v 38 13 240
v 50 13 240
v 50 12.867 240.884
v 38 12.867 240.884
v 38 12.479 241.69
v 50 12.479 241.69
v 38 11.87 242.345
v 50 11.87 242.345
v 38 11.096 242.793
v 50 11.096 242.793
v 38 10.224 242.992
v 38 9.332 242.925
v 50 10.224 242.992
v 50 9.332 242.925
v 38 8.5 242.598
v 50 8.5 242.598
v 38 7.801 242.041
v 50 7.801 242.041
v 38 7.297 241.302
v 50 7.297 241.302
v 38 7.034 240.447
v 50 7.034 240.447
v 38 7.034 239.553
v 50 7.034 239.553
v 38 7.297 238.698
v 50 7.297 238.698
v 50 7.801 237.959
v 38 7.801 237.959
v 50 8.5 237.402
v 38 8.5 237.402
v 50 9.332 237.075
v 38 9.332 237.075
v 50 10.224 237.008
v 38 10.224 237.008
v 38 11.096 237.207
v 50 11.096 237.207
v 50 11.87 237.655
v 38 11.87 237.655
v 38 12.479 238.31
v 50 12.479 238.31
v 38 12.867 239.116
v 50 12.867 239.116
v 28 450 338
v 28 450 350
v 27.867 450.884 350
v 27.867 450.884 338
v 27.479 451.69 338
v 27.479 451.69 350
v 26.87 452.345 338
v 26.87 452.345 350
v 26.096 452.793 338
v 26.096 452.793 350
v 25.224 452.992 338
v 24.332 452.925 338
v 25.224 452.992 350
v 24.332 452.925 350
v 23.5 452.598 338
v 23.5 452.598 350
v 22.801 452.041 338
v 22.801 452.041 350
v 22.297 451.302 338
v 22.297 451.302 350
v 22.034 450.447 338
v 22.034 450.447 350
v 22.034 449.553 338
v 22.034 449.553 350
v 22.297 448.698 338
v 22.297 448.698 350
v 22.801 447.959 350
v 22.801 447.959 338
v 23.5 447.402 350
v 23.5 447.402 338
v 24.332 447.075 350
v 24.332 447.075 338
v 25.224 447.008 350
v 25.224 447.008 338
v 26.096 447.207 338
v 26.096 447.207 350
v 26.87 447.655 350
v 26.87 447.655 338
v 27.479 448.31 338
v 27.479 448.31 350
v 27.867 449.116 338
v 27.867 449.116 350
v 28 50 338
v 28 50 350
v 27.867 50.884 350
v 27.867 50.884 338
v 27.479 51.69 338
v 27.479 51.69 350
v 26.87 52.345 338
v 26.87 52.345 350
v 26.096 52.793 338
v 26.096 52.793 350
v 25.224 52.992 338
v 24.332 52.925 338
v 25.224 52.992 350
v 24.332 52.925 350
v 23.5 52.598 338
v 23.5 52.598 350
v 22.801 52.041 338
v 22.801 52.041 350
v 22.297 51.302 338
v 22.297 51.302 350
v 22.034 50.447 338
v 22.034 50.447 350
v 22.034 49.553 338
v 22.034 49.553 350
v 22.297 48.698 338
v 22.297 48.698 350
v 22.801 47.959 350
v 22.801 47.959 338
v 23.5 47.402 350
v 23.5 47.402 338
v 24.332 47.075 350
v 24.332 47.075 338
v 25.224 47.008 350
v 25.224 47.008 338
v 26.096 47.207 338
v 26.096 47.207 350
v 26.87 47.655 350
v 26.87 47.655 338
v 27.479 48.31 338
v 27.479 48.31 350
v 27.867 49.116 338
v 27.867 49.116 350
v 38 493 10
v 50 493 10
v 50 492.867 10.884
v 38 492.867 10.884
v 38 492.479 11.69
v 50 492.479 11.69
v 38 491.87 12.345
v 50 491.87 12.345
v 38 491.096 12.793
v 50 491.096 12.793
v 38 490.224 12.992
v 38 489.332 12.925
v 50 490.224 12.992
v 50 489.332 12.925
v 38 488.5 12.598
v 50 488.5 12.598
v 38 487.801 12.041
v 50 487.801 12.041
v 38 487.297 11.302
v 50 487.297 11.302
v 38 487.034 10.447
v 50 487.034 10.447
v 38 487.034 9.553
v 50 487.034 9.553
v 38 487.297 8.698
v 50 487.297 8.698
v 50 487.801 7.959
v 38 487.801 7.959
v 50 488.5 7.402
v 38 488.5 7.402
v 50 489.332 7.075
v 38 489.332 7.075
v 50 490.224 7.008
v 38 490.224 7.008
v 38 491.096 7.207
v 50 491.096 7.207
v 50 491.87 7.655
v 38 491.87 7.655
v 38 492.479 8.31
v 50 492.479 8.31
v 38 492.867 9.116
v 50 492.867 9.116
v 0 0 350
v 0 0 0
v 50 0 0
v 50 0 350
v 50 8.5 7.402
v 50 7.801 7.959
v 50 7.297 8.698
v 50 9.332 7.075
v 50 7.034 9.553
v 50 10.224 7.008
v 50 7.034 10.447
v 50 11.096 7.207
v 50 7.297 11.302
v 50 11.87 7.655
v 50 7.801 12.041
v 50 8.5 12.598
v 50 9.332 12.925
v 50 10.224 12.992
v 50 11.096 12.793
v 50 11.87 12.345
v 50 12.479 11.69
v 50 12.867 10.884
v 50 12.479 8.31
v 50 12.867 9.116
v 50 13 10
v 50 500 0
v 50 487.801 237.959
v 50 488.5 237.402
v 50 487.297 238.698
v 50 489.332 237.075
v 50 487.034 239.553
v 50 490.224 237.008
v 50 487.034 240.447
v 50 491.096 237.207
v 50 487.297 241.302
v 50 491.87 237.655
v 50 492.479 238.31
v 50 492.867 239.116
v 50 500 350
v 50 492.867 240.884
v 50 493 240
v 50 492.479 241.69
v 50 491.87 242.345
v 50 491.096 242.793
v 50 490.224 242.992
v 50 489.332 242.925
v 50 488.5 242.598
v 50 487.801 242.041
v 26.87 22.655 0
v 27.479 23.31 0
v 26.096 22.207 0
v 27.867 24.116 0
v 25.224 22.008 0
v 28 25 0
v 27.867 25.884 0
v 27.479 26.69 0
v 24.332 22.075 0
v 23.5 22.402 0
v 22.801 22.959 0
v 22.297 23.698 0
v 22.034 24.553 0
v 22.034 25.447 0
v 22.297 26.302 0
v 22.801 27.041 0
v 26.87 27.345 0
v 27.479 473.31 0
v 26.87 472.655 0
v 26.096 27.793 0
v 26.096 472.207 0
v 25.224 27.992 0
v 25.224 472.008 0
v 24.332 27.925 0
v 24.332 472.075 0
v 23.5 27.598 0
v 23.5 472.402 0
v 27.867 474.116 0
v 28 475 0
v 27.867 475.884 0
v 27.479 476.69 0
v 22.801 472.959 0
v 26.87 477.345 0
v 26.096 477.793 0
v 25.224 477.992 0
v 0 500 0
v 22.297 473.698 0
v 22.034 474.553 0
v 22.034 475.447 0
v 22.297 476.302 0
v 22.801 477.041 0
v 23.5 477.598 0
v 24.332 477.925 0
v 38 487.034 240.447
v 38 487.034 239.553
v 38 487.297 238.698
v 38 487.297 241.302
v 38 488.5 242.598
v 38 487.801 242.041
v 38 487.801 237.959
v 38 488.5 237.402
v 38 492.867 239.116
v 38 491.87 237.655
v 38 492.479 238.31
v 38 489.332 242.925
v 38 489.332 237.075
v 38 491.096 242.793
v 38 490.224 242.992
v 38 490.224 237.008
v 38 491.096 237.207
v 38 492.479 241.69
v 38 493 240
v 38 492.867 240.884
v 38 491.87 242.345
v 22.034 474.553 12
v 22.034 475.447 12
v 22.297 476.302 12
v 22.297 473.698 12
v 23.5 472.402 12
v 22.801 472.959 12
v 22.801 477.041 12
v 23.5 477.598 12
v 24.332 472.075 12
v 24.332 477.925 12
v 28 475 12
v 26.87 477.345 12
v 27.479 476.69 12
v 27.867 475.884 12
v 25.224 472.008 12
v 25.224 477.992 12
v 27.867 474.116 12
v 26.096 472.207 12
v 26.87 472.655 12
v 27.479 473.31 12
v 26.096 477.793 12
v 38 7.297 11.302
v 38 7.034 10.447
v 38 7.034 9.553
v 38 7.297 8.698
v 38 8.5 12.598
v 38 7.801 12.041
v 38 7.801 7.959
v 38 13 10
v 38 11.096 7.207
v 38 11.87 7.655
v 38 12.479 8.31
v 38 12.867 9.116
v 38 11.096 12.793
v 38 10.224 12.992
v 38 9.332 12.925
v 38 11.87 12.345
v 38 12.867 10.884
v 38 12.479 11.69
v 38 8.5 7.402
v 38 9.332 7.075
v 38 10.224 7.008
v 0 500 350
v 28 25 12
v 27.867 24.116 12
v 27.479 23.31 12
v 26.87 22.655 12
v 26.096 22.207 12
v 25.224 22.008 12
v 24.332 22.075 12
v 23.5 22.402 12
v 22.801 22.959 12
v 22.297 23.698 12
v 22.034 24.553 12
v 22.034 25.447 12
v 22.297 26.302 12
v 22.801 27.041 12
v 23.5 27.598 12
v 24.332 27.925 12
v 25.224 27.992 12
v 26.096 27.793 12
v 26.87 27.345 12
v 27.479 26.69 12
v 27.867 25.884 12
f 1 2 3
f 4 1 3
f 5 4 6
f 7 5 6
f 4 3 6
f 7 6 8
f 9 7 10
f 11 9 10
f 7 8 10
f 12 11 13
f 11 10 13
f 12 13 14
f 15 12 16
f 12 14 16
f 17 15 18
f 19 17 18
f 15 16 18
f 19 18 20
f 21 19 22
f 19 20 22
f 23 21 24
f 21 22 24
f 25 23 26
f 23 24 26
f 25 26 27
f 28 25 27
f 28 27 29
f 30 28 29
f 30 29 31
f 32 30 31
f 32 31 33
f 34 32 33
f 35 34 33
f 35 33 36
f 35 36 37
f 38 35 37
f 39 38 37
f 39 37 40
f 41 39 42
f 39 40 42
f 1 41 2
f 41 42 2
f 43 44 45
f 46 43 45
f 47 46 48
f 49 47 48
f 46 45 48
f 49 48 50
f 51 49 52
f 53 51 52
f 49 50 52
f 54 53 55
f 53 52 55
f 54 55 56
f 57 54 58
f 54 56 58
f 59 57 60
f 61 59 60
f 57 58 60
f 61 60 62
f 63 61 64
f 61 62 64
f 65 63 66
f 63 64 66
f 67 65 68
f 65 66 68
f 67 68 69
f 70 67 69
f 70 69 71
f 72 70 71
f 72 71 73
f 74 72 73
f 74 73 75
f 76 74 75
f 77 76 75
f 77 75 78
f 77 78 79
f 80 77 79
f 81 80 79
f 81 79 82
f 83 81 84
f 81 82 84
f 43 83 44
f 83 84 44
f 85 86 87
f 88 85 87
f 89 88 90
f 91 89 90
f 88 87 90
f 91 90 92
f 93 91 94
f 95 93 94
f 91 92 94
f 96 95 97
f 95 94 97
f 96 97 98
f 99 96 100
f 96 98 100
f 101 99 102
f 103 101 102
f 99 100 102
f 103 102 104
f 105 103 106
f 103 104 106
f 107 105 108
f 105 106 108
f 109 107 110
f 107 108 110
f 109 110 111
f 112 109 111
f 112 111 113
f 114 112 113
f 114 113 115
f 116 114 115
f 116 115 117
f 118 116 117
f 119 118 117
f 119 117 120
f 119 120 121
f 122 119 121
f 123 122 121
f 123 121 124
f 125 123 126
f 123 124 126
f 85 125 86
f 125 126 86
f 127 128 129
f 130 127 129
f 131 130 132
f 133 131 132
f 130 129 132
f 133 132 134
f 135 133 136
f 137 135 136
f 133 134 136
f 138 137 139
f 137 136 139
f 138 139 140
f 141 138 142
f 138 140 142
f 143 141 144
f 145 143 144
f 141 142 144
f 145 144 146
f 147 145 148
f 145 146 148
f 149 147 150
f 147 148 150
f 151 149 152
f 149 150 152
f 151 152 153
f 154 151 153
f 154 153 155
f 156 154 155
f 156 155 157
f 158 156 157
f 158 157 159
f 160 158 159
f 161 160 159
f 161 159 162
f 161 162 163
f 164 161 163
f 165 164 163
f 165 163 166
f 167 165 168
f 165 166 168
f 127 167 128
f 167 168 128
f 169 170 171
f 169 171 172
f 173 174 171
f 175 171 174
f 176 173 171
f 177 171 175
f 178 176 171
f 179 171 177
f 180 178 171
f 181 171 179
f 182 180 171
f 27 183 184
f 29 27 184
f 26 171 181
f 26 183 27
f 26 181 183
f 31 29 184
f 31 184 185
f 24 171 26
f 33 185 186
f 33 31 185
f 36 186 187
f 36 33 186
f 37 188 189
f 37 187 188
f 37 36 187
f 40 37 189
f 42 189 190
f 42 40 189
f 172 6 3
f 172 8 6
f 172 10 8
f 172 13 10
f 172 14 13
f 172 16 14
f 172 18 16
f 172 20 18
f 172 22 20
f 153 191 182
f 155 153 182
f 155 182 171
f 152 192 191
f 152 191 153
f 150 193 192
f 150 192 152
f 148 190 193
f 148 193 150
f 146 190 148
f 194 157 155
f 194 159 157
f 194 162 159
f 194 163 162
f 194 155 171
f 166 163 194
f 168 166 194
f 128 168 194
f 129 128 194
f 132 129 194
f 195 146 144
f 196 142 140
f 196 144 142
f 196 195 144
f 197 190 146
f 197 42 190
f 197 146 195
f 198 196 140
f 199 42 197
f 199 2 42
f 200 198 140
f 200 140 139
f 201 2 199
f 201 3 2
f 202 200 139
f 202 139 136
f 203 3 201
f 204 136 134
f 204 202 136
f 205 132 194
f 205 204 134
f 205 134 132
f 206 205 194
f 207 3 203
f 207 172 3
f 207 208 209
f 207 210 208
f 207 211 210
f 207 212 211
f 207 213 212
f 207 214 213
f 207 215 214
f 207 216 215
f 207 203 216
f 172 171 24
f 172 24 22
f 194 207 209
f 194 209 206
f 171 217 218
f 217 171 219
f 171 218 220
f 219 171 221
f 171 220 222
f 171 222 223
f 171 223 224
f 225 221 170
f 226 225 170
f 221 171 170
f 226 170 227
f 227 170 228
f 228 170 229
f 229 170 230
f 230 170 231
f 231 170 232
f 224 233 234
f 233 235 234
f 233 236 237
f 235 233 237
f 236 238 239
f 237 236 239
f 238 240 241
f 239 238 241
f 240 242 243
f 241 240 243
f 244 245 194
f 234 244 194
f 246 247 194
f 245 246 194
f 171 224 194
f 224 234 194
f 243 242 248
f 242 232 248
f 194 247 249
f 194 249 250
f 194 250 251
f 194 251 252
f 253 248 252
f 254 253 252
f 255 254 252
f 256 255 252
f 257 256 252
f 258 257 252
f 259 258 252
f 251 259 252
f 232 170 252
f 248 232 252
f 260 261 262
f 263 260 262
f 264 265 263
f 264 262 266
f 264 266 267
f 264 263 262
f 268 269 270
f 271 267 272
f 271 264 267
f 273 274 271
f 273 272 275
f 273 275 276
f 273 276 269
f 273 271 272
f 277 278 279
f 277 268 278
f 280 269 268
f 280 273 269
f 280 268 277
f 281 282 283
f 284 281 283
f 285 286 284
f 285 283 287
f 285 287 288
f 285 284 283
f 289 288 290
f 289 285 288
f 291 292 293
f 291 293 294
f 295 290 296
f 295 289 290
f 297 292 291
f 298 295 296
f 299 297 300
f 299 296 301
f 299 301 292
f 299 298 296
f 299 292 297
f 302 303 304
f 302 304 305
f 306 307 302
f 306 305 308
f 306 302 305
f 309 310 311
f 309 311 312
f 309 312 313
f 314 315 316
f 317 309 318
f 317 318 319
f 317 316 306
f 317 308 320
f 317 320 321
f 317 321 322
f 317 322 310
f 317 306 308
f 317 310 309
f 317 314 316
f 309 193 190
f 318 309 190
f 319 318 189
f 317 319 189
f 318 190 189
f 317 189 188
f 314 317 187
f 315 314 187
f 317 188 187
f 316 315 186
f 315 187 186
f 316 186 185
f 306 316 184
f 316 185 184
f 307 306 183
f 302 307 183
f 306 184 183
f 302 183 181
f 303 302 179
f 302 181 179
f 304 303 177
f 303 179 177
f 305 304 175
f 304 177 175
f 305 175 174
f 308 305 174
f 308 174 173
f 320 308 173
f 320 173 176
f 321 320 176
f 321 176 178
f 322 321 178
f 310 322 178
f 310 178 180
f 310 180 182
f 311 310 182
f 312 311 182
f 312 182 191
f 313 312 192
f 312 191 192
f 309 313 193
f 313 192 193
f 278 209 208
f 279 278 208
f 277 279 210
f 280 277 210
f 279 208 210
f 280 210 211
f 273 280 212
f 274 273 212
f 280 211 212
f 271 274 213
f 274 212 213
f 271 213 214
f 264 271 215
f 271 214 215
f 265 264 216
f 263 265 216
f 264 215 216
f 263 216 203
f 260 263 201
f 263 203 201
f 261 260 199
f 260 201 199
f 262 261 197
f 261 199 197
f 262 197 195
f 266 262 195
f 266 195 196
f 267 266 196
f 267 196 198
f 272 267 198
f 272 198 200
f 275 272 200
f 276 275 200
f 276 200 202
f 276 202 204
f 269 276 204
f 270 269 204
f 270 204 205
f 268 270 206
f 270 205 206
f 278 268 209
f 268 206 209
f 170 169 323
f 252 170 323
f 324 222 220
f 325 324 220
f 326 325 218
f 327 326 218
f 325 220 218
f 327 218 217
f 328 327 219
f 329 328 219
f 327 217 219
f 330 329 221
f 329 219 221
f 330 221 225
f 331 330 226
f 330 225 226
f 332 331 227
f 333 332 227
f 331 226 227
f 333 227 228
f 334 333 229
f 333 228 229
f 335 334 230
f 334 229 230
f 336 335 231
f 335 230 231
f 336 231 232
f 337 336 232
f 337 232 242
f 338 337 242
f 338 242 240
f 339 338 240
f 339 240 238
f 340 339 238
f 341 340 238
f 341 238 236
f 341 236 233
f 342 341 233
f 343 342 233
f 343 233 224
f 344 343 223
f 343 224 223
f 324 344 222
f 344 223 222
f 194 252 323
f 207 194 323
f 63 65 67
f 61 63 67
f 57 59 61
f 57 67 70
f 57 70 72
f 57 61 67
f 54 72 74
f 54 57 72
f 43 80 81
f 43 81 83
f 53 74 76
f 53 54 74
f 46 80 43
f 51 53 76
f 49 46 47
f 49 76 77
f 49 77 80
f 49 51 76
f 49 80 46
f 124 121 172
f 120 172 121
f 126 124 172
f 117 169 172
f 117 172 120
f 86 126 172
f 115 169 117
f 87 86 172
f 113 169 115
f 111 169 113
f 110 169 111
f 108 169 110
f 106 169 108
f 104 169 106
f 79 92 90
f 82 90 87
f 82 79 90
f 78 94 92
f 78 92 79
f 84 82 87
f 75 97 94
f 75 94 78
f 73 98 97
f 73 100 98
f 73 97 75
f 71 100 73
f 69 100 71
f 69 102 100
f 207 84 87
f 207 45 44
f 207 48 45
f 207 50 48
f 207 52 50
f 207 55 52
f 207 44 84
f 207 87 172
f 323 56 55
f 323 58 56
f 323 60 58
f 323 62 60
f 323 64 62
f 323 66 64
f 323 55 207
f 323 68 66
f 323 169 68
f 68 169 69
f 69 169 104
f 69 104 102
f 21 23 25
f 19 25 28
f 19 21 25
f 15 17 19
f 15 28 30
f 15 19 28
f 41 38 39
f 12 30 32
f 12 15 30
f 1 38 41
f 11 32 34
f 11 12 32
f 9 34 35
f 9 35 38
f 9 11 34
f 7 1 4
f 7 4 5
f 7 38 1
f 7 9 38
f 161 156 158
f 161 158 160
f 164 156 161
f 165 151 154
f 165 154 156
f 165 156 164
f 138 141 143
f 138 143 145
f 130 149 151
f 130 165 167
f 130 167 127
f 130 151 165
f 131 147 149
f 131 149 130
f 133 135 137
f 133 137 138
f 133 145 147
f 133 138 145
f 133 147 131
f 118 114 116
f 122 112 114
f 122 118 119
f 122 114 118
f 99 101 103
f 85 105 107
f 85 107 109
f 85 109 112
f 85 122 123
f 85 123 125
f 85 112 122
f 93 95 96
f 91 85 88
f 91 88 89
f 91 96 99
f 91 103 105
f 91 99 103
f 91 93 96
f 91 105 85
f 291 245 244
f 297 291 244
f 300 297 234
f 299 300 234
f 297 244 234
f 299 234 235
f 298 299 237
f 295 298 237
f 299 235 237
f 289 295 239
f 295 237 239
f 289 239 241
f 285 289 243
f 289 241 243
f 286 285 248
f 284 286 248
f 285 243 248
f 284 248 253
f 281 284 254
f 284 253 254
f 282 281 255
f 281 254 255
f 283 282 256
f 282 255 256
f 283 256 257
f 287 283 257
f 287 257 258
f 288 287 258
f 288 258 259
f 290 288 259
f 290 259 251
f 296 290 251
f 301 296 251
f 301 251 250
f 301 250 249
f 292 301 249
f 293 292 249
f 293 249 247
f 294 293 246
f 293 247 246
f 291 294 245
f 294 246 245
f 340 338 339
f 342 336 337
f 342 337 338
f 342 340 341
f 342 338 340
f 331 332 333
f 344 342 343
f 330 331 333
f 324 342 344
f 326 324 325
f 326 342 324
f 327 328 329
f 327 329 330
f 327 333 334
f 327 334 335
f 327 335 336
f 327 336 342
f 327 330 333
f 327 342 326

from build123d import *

# Parameters (mm, degrees)
F0_W      = 500
F0_H      = 350
F1_DEPTH  = 50
F2_R      = 3
F3_DEPTH  = 12
F4_DEPTH  = 12
F5_R      = 3
F6_DEPTH  = 12
F7_R      = 3
F8_DEPTH  = 12
F9_R      = 3
F10_DEPTH = 12


with BuildPart() as f1:
    # F0 (on Right) → F1 (new body)
    with BuildSketch(Plane.YZ):
        with Locations((250, 175)):
            Rectangle(F0_W, F0_H)
    extrude(amount=F1_DEPTH)

    # F2 (on face) → F3 (cut)
    with BuildSketch(Plane.XY.offset(350)):
        with Locations((25, 50)):
            Circle(F2_R)
    extrude(amount=-F3_DEPTH, mode=Mode.SUBTRACT)

    # F2 (on face) → F4 (cut)
    with BuildSketch(Plane.XY.offset(350)):
        with Locations((25, 450)):
            Circle(F2_R)
    extrude(amount=-F4_DEPTH, mode=Mode.SUBTRACT)

    # F5 (on face) → F6 (cut)
    with BuildSketch(Plane.YZ.offset(50)):
        with Locations((10, 240)):
            Circle(F5_R)
        with Locations((10, 10)):
            Circle(F5_R)
    extrude(amount=-F6_DEPTH, mode=Mode.SUBTRACT)

    # F7 (on face) → F8 (cut)
    with BuildSketch(Plane.YZ.offset(50)):
        with Locations((490, 240)):
            Circle(F7_R)
        with Locations((490, 10)):
            Circle(F7_R)
    extrude(amount=-F8_DEPTH, mode=Mode.SUBTRACT)

    # F9 (on face) → F10 (cut)
    with BuildSketch(Plane(origin=(0, 0, 0), x_dir=(1, 0, 0), z_dir=(0, 0, -1))):
        with Locations((25, -25)):
            Circle(F9_R)
        with Locations((25, -475)):
            Circle(F9_R)
    extrude(amount=-F10_DEPTH, mode=Mode.SUBTRACT)


solid = f1.part
